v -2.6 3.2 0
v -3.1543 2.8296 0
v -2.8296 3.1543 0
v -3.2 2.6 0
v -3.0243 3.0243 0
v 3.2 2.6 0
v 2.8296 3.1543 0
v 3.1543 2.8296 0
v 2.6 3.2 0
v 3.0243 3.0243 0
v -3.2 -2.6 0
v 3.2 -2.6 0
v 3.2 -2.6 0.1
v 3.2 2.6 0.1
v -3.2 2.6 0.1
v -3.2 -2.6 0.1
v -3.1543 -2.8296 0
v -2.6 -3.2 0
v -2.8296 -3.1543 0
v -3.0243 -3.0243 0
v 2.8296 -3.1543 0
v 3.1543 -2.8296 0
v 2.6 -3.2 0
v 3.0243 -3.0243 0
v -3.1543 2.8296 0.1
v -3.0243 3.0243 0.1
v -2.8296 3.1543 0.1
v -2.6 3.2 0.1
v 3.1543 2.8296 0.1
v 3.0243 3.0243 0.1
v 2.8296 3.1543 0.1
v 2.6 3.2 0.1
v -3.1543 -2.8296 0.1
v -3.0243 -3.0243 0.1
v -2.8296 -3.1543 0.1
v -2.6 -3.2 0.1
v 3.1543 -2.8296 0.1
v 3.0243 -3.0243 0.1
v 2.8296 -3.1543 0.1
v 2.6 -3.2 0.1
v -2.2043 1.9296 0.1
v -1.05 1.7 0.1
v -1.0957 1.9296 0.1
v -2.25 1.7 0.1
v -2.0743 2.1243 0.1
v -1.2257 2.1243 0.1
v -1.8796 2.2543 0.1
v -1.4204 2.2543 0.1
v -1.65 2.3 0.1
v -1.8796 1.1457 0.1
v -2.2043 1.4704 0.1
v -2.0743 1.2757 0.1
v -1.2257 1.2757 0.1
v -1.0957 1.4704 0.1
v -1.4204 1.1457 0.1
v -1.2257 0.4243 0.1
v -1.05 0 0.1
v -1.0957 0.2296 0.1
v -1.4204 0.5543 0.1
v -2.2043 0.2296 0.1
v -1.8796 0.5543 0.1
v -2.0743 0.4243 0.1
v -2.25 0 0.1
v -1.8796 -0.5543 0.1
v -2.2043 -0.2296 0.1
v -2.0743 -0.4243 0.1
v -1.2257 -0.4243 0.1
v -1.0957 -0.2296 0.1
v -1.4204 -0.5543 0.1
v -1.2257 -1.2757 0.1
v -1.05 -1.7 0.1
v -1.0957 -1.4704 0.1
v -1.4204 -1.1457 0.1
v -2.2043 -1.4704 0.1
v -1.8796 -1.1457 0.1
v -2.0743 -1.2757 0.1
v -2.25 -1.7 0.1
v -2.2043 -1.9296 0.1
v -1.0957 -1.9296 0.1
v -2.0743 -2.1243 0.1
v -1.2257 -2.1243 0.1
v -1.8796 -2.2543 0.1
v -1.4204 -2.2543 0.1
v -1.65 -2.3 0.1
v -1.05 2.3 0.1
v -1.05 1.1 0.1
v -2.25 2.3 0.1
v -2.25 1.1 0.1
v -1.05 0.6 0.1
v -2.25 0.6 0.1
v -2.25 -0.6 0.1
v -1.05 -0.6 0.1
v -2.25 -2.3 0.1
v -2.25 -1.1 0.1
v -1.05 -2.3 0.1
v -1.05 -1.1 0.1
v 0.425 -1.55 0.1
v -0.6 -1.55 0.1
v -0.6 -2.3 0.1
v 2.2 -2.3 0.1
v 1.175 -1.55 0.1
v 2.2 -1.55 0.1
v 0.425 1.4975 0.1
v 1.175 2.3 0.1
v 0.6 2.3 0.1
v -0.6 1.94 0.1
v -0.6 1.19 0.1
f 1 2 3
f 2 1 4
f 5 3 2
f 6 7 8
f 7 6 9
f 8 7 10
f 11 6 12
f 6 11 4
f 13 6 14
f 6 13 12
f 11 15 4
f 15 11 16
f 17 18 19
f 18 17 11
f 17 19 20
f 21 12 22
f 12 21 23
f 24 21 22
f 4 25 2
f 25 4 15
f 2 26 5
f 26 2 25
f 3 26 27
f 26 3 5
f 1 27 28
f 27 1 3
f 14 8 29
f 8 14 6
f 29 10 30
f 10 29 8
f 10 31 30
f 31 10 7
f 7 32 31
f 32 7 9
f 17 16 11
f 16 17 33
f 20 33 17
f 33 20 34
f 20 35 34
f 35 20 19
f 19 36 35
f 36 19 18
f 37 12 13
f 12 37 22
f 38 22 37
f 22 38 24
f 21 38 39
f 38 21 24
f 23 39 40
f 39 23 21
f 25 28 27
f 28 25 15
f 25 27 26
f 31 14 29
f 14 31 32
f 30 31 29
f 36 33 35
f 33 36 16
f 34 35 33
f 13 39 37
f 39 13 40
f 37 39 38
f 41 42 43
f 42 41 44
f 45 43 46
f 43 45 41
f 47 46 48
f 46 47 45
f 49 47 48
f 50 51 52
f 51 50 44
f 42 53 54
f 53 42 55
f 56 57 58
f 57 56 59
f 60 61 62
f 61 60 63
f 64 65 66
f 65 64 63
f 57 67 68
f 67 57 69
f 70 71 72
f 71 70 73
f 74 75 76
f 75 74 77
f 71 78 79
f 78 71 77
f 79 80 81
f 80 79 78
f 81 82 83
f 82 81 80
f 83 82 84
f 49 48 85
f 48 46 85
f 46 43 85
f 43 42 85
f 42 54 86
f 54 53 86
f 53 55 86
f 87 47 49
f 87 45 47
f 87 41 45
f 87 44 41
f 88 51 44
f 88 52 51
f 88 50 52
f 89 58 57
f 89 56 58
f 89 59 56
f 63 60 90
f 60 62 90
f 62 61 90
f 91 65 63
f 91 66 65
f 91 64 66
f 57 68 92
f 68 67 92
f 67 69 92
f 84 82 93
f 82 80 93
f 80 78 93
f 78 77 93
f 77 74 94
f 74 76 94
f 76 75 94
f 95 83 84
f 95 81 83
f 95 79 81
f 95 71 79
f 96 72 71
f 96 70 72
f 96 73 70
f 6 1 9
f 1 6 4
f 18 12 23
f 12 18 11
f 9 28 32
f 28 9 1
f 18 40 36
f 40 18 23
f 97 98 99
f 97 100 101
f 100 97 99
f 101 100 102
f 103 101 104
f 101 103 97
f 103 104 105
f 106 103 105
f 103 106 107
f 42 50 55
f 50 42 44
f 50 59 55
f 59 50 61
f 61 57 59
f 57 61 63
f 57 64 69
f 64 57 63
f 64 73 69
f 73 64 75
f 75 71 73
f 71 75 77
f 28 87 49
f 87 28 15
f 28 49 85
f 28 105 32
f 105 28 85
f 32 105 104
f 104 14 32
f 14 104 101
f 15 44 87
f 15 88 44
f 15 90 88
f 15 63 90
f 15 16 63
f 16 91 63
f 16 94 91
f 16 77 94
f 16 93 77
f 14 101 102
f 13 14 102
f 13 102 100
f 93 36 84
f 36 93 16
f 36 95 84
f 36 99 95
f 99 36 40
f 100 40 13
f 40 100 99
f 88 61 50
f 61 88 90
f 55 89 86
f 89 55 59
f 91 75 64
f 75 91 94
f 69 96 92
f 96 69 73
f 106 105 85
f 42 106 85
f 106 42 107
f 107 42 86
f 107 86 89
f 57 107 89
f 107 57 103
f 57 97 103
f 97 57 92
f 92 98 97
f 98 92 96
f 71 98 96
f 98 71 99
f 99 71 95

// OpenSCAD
// file: ../p/box3u12.scad
use <../lib.scad>
function ldraw_lib__box3u12() = [
// 0 Box with 3 Parallel Faces without Any Edges
// 0 Name: box3u12.dat
// 0 Author: J.C. Tchang [tchang]
// 0 !LDRAW_ORG Primitive UPDATE 2014-02
// 0 !LICENSE Licensed under CC BY 4.0 : see CAreadme.txt
// 
// 0 BFC CERTIFY CCW
  [0,"BFC","CERTIFY"],
  [0,"BFC","CCW"],
// 
// 0 !HISTORY 2014-12-23 [PTadmin] Official Update 2014-02
// 
// 
// 4 16 -1 1 1 1 1 1 1 1 -1 -1 1 -1
  [4,16,-1,1,1,1,1,1,1,1,-1,-1,1,-1],
// 4 16 -1 1 1 -1 0 1 1 0 1 1 1 1
  [4,16,-1,1,1,-1,0,1,1,0,1,1,1,1],
// 4 16 1 1 -1 1 0 -1 -1 0 -1 -1 1 -1
  [4,16,1,1,-1,1,0,-1,-1,0,-1,-1,1,-1],
];
module ldraw_lib__box3u12(step=0, col=false, unit=2/5, alt=false, line=0.2, solid=!$preview)
    makepoly(ldraw_lib__box3u12(), step=step, col=col, unit=unit, alt=alt, line=line, solid=solid);
ldraw_lib__box3u12(line=0.2);
// file: ../p/7-16ndis.scad
use <../lib.scad>
function ldraw_lib__7_16ndis() = [
// 0 Disc Negative 0.4375
// 0 Name: 7-16ndis.dat
// 0 Author: Alex Taylor [anathema]
// 0 !LDRAW_ORG Primitive UPDATE 2010-01
// 0 !LICENSE Licensed under CC BY 2.0 and CC BY 4.0 : see CAreadme.txt
// 
// 0 BFC CERTIFY CCW
  [0,"BFC","CERTIFY"],
  [0,"BFC","CCW"],
// 
// 0 !HISTORY 2010-04-05 [PTadmin] Official Update 2010-01
// 
// 
// 3 16 1 0 1 0.9239 0 0.3827 1 0 0
  [3,16,1,0,1,0.9239,0,0.3827,1,0,0],
// 3 16 1 0 1 0.7071 0 0.7071 0.9239 0 0.3827
  [3,16,1,0,1,0.7071,0,0.7071,0.9239,0,0.3827],
// 3 16 1 0 1 0.3827 0 0.9239 0.7071 0 0.7071
  [3,16,1,0,1,0.3827,0,0.9239,0.7071,0,0.7071],
// 3 16 1 0 1 0 0 1 0.3827 0 0.9239
  [3,16,1,0,1,0,0,1,0.3827,0,0.9239],
// 3 16 -1 0 1 -0.3827 0 0.9239 0 0 1
  [3,16,-1,0,1,-0.3827,0,0.9239,0,0,1],
// 3 16 -1 0 1 -0.7071 0 0.7071 -0.3827 0 0.9239
  [3,16,-1,0,1,-0.7071,0,0.7071,-0.3827,0,0.9239],
// 3 16 -1 0 1 -0.9239 0 0.3827 -0.7071 0 0.7071
  [3,16,-1,0,1,-0.9239,0,0.3827,-0.7071,0,0.7071],
// 0
];
module ldraw_lib__7_16ndis(step=0, col=false, unit=2/5, alt=false, line=0.2, solid=!$preview)
    makepoly(ldraw_lib__7_16ndis(), step=step, col=col, unit=unit, alt=alt, line=line, solid=solid);
ldraw_lib__7_16ndis(line=0.2);
// file: ../p/3-16ndis.scad
use <../lib.scad>
function ldraw_lib__3_16ndis() = [
// 0 Disc Negative 0.1875
// 0 Name: 3-16ndis.dat
// 0 Author: Guy Vivan [guyvivan]
// 0 !LDRAW_ORG Primitive UPDATE 2009-01
// 0 !LICENSE Licensed under CC BY 2.0 and CC BY 4.0 : see CAreadme.txt
// 
// 0 BFC CERTIFY CCW
  [0,"BFC","CERTIFY"],
  [0,"BFC","CCW"],
// 
// 0 !HISTORY 2009-05-02 [PTadmin] Official Update 2009-01
// 
// 
// 3 16 1 0 1 0.9239 0 0.3827 1 0 0
  [3,16,1,0,1,0.9239,0,0.3827,1,0,0],
// 3 16 1 0 1 0.7071 0 0.7071 0.9239 0 0.3827
  [3,16,1,0,1,0.7071,0,0.7071,0.9239,0,0.3827],
// 3 16 1 0 1 0.3827 0 0.9239 0.7071 0 0.7071
  [3,16,1,0,1,0.3827,0,0.9239,0.7071,0,0.7071],
// 
// 0 end of file
// 
];
module ldraw_lib__3_16ndis(step=0, col=false, unit=2/5, alt=false, line=0.2, solid=!$preview)
    makepoly(ldraw_lib__3_16ndis(), step=step, col=col, unit=unit, alt=alt, line=line, solid=solid);
ldraw_lib__3_16ndis(line=0.2);
// file: ../p/3-16chrd.scad
use <../lib.scad>
function ldraw_lib__3_16chrd() = [
// 0 Chord 0.1875
// 0 Name: 3-16chrd.dat
// 0 Author: Niels Karsdorp [nielsk]
// 0 !LDRAW_ORG Primitive UPDATE 2009-01
// 0 !LICENSE Licensed under CC BY 2.0 and CC BY 4.0 : see CAreadme.txt
// 
// 0 BFC CERTIFY CCW
  [0,"BFC","CERTIFY"],
  [0,"BFC","CCW"],
// 
// 0 !HISTORY 2009-05-02 [PTadmin] Official Update 2009-01
// 
// 
// 4 16 1 0 0 0.9239 0 0.3827 0.7071 0 0.7071 0.3827 0 0.9239
  [4,16,1,0,0,0.9239,0,0.3827,0.7071,0,0.7071,0.3827,0,0.9239],
// 0
// 
];
module ldraw_lib__3_16chrd(step=0, col=false, unit=2/5, alt=false, line=0.2, solid=!$preview)
    makepoly(ldraw_lib__3_16chrd(), step=step, col=col, unit=unit, alt=alt, line=line, solid=solid);
ldraw_lib__3_16chrd(line=0.2);
// file: ../p/2-4chrd.scad
use <../lib.scad>
function ldraw_lib__2_4chrd() = [
// 0 Chord 0.5
// 0 Name: 2-4chrd.dat
// 0 Author: Philippe Hurbain [Philo]
// 0 !LDRAW_ORG Primitive UPDATE 2014-01
// 0 !LICENSE Licensed under CC BY 4.0 : see CAreadme.txt
// 
// 0 BFC CERTIFY CCW
  [0,"BFC","CERTIFY"],
  [0,"BFC","CCW"],
// 
// 0 !HISTORY 2014-06-21 [PTadmin] Official Update 2014-01
// 
// 
// 4 16 0.9239 0 0.3827 -0.9239 0 0.3827 -1 0 0 1 0 0
  [4,16,0.9239,0,0.3827,-0.9239,0,0.3827,-1,0,0,1,0,0],
// 4 16 0.7071 0 0.7071 -0.7071 0 0.7071 -0.9239 0 0.3827 0.9239 0 0.3827
  [4,16,0.7071,0,0.7071,-0.7071,0,0.7071,-0.9239,0,0.3827,0.9239,0,0.3827],
// 4 16 0.3827 0 0.9239 -0.3827 0 0.9239 -0.7071 0 0.7071 0.7071 0 0.7071
  [4,16,0.3827,0,0.9239,-0.3827,0,0.9239,-0.7071,0,0.7071,0.7071,0,0.7071],
// 3 16 0 0 1 -0.3827 0 0.9239 0.3827 0 0.9239
  [3,16,0,0,1,-0.3827,0,0.9239,0.3827,0,0.9239],
];
module ldraw_lib__2_4chrd(step=0, col=false, unit=2/5, alt=false, line=0.2, solid=!$preview)
    makepoly(ldraw_lib__2_4chrd(), step=step, col=col, unit=unit, alt=alt, line=line, solid=solid);
ldraw_lib__2_4chrd(line=0.2);
// file: ../p/1-4cyli.scad
use <../lib.scad>
function ldraw_lib__1_4cyli() = [
// 0 Cylinder 0.25
// 0 Name: 1-4cyli.dat
// 0 Author: James Jessiman
// 0 !LDRAW_ORG Primitive UPDATE 2012-01
// 0 !LICENSE Licensed under CC BY 4.0 : see CAreadme.txt
// 
// 0 BFC CERTIFY CCW
  [0,"BFC","CERTIFY"],
  [0,"BFC","CCW"],
// 
// 0 !HISTORY 2002-03-23 [sbliss] Added BFC statement.
// 0 !HISTORY 2002-04-25 [PTadmin] Official Update 2002-02
// 0 !HISTORY 2007-06-22 [PTadmin] Header formatted for Contributor Agreement
// 0 !HISTORY 2008-07-01 [PTadmin] Official Update 2008-01
// 0 !HISTORY 2012-02-16 [Philo] Changed to CCW
// 0 !HISTORY 2012-03-30 [PTadmin] Official Update 2012-01
// 
// 
// 4 16 1 1 0 0.9239 1 0.3827 0.9239 0 0.3827 1 0 0
  [4,16,1,1,0,0.9239,1,0.3827,0.9239,0,0.3827,1,0,0],
// 5 24 1 0 0 1 1 0 0.9239 0 0.3827 1 0 -1
  [5,24,1,0,0,1,1,0,0.9239,0,0.3827,1,0,-1],
// 4 16 0.9239 1 0.3827 0.7071 1 0.7071 0.7071 0 0.7071 0.9239 0 0.3827
  [4,16,0.9239,1,0.3827,0.7071,1,0.7071,0.7071,0,0.7071,0.9239,0,0.3827],
// 5 24 0.9239 0 0.3827 0.9239 1 0.3827 0.7071 0 0.7071 1 0 0
  [5,24,0.9239,0,0.3827,0.9239,1,0.3827,0.7071,0,0.7071,1,0,0],
// 4 16 0.7071 1 0.7071 0.3827 1 0.9239 0.3827 0 0.9239 0.7071 0 0.7071
  [4,16,0.7071,1,0.7071,0.3827,1,0.9239,0.3827,0,0.9239,0.7071,0,0.7071],
// 5 24 0.7071 0 0.7071 0.7071 1 0.7071 0.3827 0 0.9239 0.9239 0 0.3827
  [5,24,0.7071,0,0.7071,0.7071,1,0.7071,0.3827,0,0.9239,0.9239,0,0.3827],
// 4 16 0.3827 1 0.9239 0 1 1 0 0 1 0.3827 0 0.9239
  [4,16,0.3827,1,0.9239,0,1,1,0,0,1,0.3827,0,0.9239],
// 5 24 0.3827 0 0.9239 0.3827 1 0.9239 0 0 1 0.7071 0 0.7071
  [5,24,0.3827,0,0.9239,0.3827,1,0.9239,0,0,1,0.7071,0,0.7071],
// 5 24 0 0 1 0 1 1 0.3827 0 0.9239 -1 0 1
  [5,24,0,0,1,0,1,1,0.3827,0,0.9239,-1,0,1],
];
module ldraw_lib__1_4cyli(step=0, col=false, unit=2/5, alt=false, line=0.2, solid=!$preview)
    makepoly(ldraw_lib__1_4cyli(), step=step, col=col, unit=unit, alt=alt, line=line, solid=solid);
ldraw_lib__1_4cyli(line=0.2);
// file: ../p/1-4chrd.scad
use <../lib.scad>
function ldraw_lib__1_4chrd() = [
// 0 Chord 0.25
// 0 Name: 1-4chrd.dat
// 0 Author: Tony Hafner [hafhead]
// 0 !LDRAW_ORG Primitive UPDATE 2012-02
// 0 !LICENSE Licensed under CC BY 2.0 and CC BY 4.0 : see CAreadme.txt
// 
// 0 BFC CERTIFY CCW
  [0,"BFC","CERTIFY"],
  [0,"BFC","CCW"],
// 
// 0 !HISTORY 2004-04-22 [PTadmin] Official Update 2004-02
// 0 !HISTORY 2007-10-09 [PTadmin] Header formatted for Contributor Agreement
// 0 !HISTORY 2008-07-01 [PTadmin] Official Update 2008-01
// 0 !HISTORY 2012-08-02 [MMR1988] Re-creation with PrimGen2 and Rectifier
// 0 !HISTORY 2012-08-09 [PTadmin] Official Update 2012-02
// 
// 
// 4 16 0.9239 0 0.3827 0.3827 0 0.9239 0 0 1 1 0 0
  [4,16,0.9239,0,0.3827,0.3827,0,0.9239,0,0,1,1,0,0],
// 3 16 0.7071 0 0.7071 0.3827 0 0.9239 0.9239 0 0.3827
  [3,16,0.7071,0,0.7071,0.3827,0,0.9239,0.9239,0,0.3827],
];
module ldraw_lib__1_4chrd(step=0, col=false, unit=2/5, alt=false, line=0.2, solid=!$preview)
    makepoly(ldraw_lib__1_4chrd(), step=step, col=col, unit=unit, alt=alt, line=line, solid=solid);
ldraw_lib__1_4chrd(line=0.2);
// main file
use <../lib.scad>
use <../p/1-4chrd.scad>
use <../p/1-4cyli.scad>
use <../p/2-4chrd.scad>
use <../p/3-16chrd.scad>
use <../p/3-16ndis.scad>
use <../p/7-16ndis.scad>
use <../p/box3u12.scad>
function ldraw_lib__6142275d() = [
// 0 Sticker  0.8 x  0.8 with White Number 1 and  3 Dark Grey Circles Left on Red Background
// 0 Name: 6142275d.dat
// 0 Author: Massimo Maso [Sirio]
// 0 !LDRAW_ORG Part UPDATE 2022-06
// 0 !LICENSE Licensed under CC BY 4.0 : see CAreadme.txt
// 
// 0 BFC CERTIFY CCW
  [0,"BFC","CERTIFY"],
  [0,"BFC","CCW"],
// 
// 0 !KEYWORDS Audi, e-tron, quattro, R18, Set 75872, Speed Champions
// 
// 0 !HISTORY 2022-12-20 [PTadmin] Official Update 2022-06
// 
// 
// 0 // Primitives
// 
// 1 16 -6.5 0 6.5 -1.5 0 0 0 -1 0 0 0 1.5 1-4chrd.dat
  [1,16,-6.5,0,6.5,-1.5,0,0,0,-1,0,0,0,1.5, ldraw_lib__1_4chrd()],
// 1 16 6.5 0 6.5 1.5 0 0 0 -1 0 0 0 1.5 1-4chrd.dat
  [1,16,6.5,0,6.5,1.5,0,0,0,-1,0,0,0,1.5, ldraw_lib__1_4chrd()],
// 1 16 0 -.25 0 0 0 8 0 .25 0 -6.5 0 0 box3u12.dat
  [1,16,0,-.25,0,0,0,8,0,.25,0,-6.5,0,0, ldraw_lib__box3u12()],
// 1 16 -6.5 0 -6.5 -1.5 0 0 0 -1 0 0 0 -1.5 1-4chrd.dat
  [1,16,-6.5,0,-6.5,-1.5,0,0,0,-1,0,0,0,-1.5, ldraw_lib__1_4chrd()],
// 1 16 6.5 0 -6.5 1.5 0 0 0 -1 0 0 0 -1.5 1-4chrd.dat
  [1,16,6.5,0,-6.5,1.5,0,0,0,-1,0,0,0,-1.5, ldraw_lib__1_4chrd()],
// 1 16 -6.5 0 6.5 -1.5 0 0 0 -.25 0 0 0 1.5 1-4cyli.dat
  [1,16,-6.5,0,6.5,-1.5,0,0,0,-.25,0,0,0,1.5, ldraw_lib__1_4cyli()],
// 1 16 6.5 0 6.5 1.5 0 0 0 -.25 0 0 0 1.5 1-4cyli.dat
  [1,16,6.5,0,6.5,1.5,0,0,0,-.25,0,0,0,1.5, ldraw_lib__1_4cyli()],
// 1 16 -6.5 0 -6.5 -1.5 0 0 0 -.25 0 0 0 -1.5 1-4cyli.dat
  [1,16,-6.5,0,-6.5,-1.5,0,0,0,-.25,0,0,0,-1.5, ldraw_lib__1_4cyli()],
// 1 16 6.5 0 -6.5 1.5 0 0 0 -.25 0 0 0 -1.5 1-4cyli.dat
  [1,16,6.5,0,-6.5,1.5,0,0,0,-.25,0,0,0,-1.5, ldraw_lib__1_4cyli()],
// 1 4 -6.5 -.25 6.5 -1.5 0 0 0 1 0 0 0 1.5 1-4chrd.dat
  [1,4,-6.5,-.25,6.5,-1.5,0,0,0,1,0,0,0,1.5, ldraw_lib__1_4chrd()],
// 1 4 6.5 -.25 6.5 1.5 0 0 0 1 0 0 0 1.5 1-4chrd.dat
  [1,4,6.5,-.25,6.5,1.5,0,0,0,1,0,0,0,1.5, ldraw_lib__1_4chrd()],
// 1 4 -6.5 -.25 -6.5 -1.5 0 0 0 1 0 0 0 -1.5 1-4chrd.dat
  [1,4,-6.5,-.25,-6.5,-1.5,0,0,0,1,0,0,0,-1.5, ldraw_lib__1_4chrd()],
// 1 4 6.5 -.25 -6.5 1.5 0 0 0 1 0 0 0 -1.5 1-4chrd.dat
  [1,4,6.5,-.25,-6.5,1.5,0,0,0,1,0,0,0,-1.5, ldraw_lib__1_4chrd()],
// 1 72 -4.125 -.25 4.25 1.5 0 0 0 1 0 0 0 1.5 2-4chrd.dat
  [1,72,-4.125,-.25,4.25,1.5,0,0,0,1,0,0,0,1.5, ldraw_lib__2_4chrd()],
// 1 72 -4.125 -.25 4.25 -1.5 0 0 0 1 0 0 0 -1.5 3-16chrd.dat
  [1,72,-4.125,-.25,4.25,-1.5,0,0,0,1,0,0,0,-1.5, ldraw_lib__3_16chrd()],
// 1 72 -4.125 -.25 4.25 1.5 0 0 0 1 0 0 0 -1.5 3-16chrd.dat
  [1,72,-4.125,-.25,4.25,1.5,0,0,0,1,0,0,0,-1.5, ldraw_lib__3_16chrd()],
// 1 72 -4.125 -.25 0 1.5 0 0 0 1 0 0 0 1.5 3-16chrd.dat
  [1,72,-4.125,-.25,0,1.5,0,0,0,1,0,0,0,1.5, ldraw_lib__3_16chrd()],
// 1 72 -4.125 -.25 0 -1.5 0 0 0 1 0 0 0 1.5 3-16chrd.dat
  [1,72,-4.125,-.25,0,-1.5,0,0,0,1,0,0,0,1.5, ldraw_lib__3_16chrd()],
// 1 72 -4.125 -.25 0 -1.5 0 0 0 1 0 0 0 -1.5 3-16chrd.dat
  [1,72,-4.125,-.25,0,-1.5,0,0,0,1,0,0,0,-1.5, ldraw_lib__3_16chrd()],
// 1 72 -4.125 -.25 0 1.5 0 0 0 1 0 0 0 -1.5 3-16chrd.dat
  [1,72,-4.125,-.25,0,1.5,0,0,0,1,0,0,0,-1.5, ldraw_lib__3_16chrd()],
// 1 72 -4.125 -.25 -4.25 1.5 0 0 0 1 0 0 0 1.5 3-16chrd.dat
  [1,72,-4.125,-.25,-4.25,1.5,0,0,0,1,0,0,0,1.5, ldraw_lib__3_16chrd()],
// 1 72 -4.125 -.25 -4.25 -1.5 0 0 0 1 0 0 0 1.5 3-16chrd.dat
  [1,72,-4.125,-.25,-4.25,-1.5,0,0,0,1,0,0,0,1.5, ldraw_lib__3_16chrd()],
// 1 72 -4.125 -.25 -4.25 1.5 0 0 0 1 0 0 0 -1.5 2-4chrd.dat
  [1,72,-4.125,-.25,-4.25,1.5,0,0,0,1,0,0,0,-1.5, ldraw_lib__2_4chrd()],
// 1 4 -4.125 -.25 4.25 0 0 1.5 0 1 0 1.5 0 0 7-16ndis.dat
  [1,4,-4.125,-.25,4.25,0,0,1.5,0,1,0,1.5,0,0, ldraw_lib__7_16ndis()],
// 1 4 -4.125 -.25 4.25 0 0 -1.5 0 1 0 1.5 0 0 7-16ndis.dat
  [1,4,-4.125,-.25,4.25,0,0,-1.5,0,1,0,1.5,0,0, ldraw_lib__7_16ndis()],
// 1 4 -4.125 -.25 0 1.5 0 0 0 1 0 0 0 1.5 3-16ndis.dat
  [1,4,-4.125,-.25,0,1.5,0,0,0,1,0,0,0,1.5, ldraw_lib__3_16ndis()],
// 1 4 -4.125 -.25 0 -1.5 0 0 0 1 0 0 0 1.5 3-16ndis.dat
  [1,4,-4.125,-.25,0,-1.5,0,0,0,1,0,0,0,1.5, ldraw_lib__3_16ndis()],
// 1 4 -4.125 -.25 0 -1.5 0 0 0 1 0 0 0 -1.5 3-16ndis.dat
  [1,4,-4.125,-.25,0,-1.5,0,0,0,1,0,0,0,-1.5, ldraw_lib__3_16ndis()],
// 1 4 -4.125 -.25 0 1.5 0 0 0 1 0 0 0 -1.5 3-16ndis.dat
  [1,4,-4.125,-.25,0,1.5,0,0,0,1,0,0,0,-1.5, ldraw_lib__3_16ndis()],
// 1 4 -4.125 -.25 -4.25 0 0 -1.5 0 1 0 -1.5 0 0 7-16ndis.dat
  [1,4,-4.125,-.25,-4.25,0,0,-1.5,0,1,0,-1.5,0,0, ldraw_lib__7_16ndis()],
// 1 4 -4.125 -.25 -4.25 0 0 1.5 0 1 0 -1.5 0 0 7-16ndis.dat
  [1,4,-4.125,-.25,-4.25,0,0,1.5,0,1,0,-1.5,0,0, ldraw_lib__7_16ndis()],
// 0 // Bottom faces
// 4 16 6.5 0 8 8 0 6.5 -8 0 6.5 -6.5 0 8
  [4,16,6.5,0,8,8,0,6.5,-8,0,6.5,-6.5,0,8],
// 4 16 6.5 0 -8 -6.5 0 -8 -8 0 -6.5 8 0 -6.5
  [4,16,6.5,0,-8,-6.5,0,-8,-8,0,-6.5,8,0,-6.5],
// 0 // Lateral faces
// 4 16 -6.5 0 8 -6.5 -.25 8 6.5 -.25 8 6.5 0 8
  [4,16,-6.5,0,8,-6.5,-.25,8,6.5,-.25,8,6.5,0,8],
// 4 16 -6.5 0 -8 6.5 0 -8 6.5 -.25 -8 -6.5 -.25 -8
  [4,16,-6.5,0,-8,6.5,0,-8,6.5,-.25,-8,-6.5,-.25,-8],
// 0 // Top faces
// 0 // White number 1
// 3 15 1.0625 -.25 -3.875 -1.5 -.25 -3.875 -1.5 -.25 -5.75
  [3,15,1.0625,-.25,-3.875,-1.5,-.25,-3.875,-1.5,-.25,-5.75],
// 4 15 1.0625 -.25 -3.875 -1.5 -.25 -5.75 5.5 -.25 -5.75 2.9375 -.25 -3.875
  [4,15,1.0625,-.25,-3.875,-1.5,-.25,-5.75,5.5,-.25,-5.75,2.9375,-.25,-3.875],
// 3 15 2.9375 -.25 -3.875 5.5 -.25 -5.75 5.5 -.25 -3.875
  [3,15,2.9375,-.25,-3.875,5.5,-.25,-5.75,5.5,-.25,-3.875],
// 4 15 2.9375 -.25 -3.875 2.9375 -.25 5.75 1.0625 -.25 3.74375 1.0625 -.25 -3.875
  [4,15,2.9375,-.25,-3.875,2.9375,-.25,5.75,1.0625,-.25,3.74375,1.0625,-.25,-3.875],
// 3 15 1.0625 -.25 3.74375 2.9375 -.25 5.75 1.5 -.25 5.75
  [3,15,1.0625,-.25,3.74375,2.9375,-.25,5.75,1.5,-.25,5.75],
// 4 15 1.0625 -.25 3.74375 1.5 -.25 5.75 -1.5 -.25 4.85 -1.5 -.25 2.975
  [4,15,1.0625,-.25,3.74375,1.5,-.25,5.75,-1.5,-.25,4.85,-1.5,-.25,2.975],
// 0 // Grey faces
// 4 72 -5.625 -.25 4.25 -4.69905 -.25 2.86415 -3.55095 -.25 2.86415 -2.625 -.25 4.25
  [4,72,-5.625,-.25,4.25,-4.69905,-.25,2.86415,-3.55095,-.25,2.86415,-2.625,-.25,4.25],
// 4 72 -4.69905 -.25 2.86415 -4.69905 -.25 1.38585 -3.55095 -.25 1.38585 -3.55095 -.25 2.86415
  [4,72,-4.69905,-.25,2.86415,-4.69905,-.25,1.38585,-3.55095,-.25,1.38585,-3.55095,-.25,2.86415],
// 4 72 -4.69905 -.25 1.38585 -5.625 -.25 0 -2.625 -.25 0 -3.55095 -.25 1.38585
  [4,72,-4.69905,-.25,1.38585,-5.625,-.25,0,-2.625,-.25,0,-3.55095,-.25,1.38585],
// 4 72 -2.625 -.25 0 -5.625 -.25 0 -4.69905 -.25 -1.38585 -3.55095 -.25 -1.38585
  [4,72,-2.625,-.25,0,-5.625,-.25,0,-4.69905,-.25,-1.38585,-3.55095,-.25,-1.38585],
// 4 72 -3.55095 -.25 -1.38585 -4.69905 -.25 -1.38585 -4.69905 -.25 -2.86415 -3.55095 -.25 -2.86415
  [4,72,-3.55095,-.25,-1.38585,-4.69905,-.25,-1.38585,-4.69905,-.25,-2.86415,-3.55095,-.25,-2.86415],
// 4 72 -4.69905 -.25 -2.86415 -5.625 -.25 -4.25 -2.625 -.25 -4.25 -3.55095 -.25 -2.86415
  [4,72,-4.69905,-.25,-2.86415,-5.625,-.25,-4.25,-2.625,-.25,-4.25,-3.55095,-.25,-2.86415],
// 0 // Red faces
// 4 4 -6.5 -.25 8 -8 -.25 6.5 -5.625 -.25 5.75 -4.125 -.25 5.75
  [4,4,-6.5,-.25,8,-8,-.25,6.5,-5.625,-.25,5.75,-4.125,-.25,5.75],
// 3 4 -6.5 -.25 8 -4.125 -.25 5.75 -2.625 -.25 5.75
  [3,4,-6.5,-.25,8,-4.125,-.25,5.75,-2.625,-.25,5.75],
// 4 4 -6.5 -.25 8 -2.625 -.25 5.75 1.5 -.25 5.75 6.5 -.25 8
  [4,4,-6.5,-.25,8,-2.625,-.25,5.75,1.5,-.25,5.75,6.5,-.25,8],
// 3 4 6.5 -.25 8 1.5 -.25 5.75 2.9375 -.25 5.75
  [3,4,6.5,-.25,8,1.5,-.25,5.75,2.9375,-.25,5.75],
// 4 4 6.5 -.25 8 2.9375 -.25 5.75 2.9375 -.25 -3.875 8 -.25 6.5
  [4,4,6.5,-.25,8,2.9375,-.25,5.75,2.9375,-.25,-3.875,8,-.25,6.5],
// 3 4 -8 -.25 6.5 -5.625 -.25 4.25 -5.625 -.25 5.75
  [3,4,-8,-.25,6.5,-5.625,-.25,4.25,-5.625,-.25,5.75],
// 3 4 -8 -.25 6.5 -5.625 -.25 2.75 -5.625 -.25 4.25
  [3,4,-8,-.25,6.5,-5.625,-.25,2.75,-5.625,-.25,4.25],
// 3 4 -8 -.25 6.5 -5.625 -.25 1.5 -5.625 -.25 2.75
  [3,4,-8,-.25,6.5,-5.625,-.25,1.5,-5.625,-.25,2.75],
// 3 4 -8 -.25 6.5 -5.625 -.25 0 -5.625 -.25 1.5
  [3,4,-8,-.25,6.5,-5.625,-.25,0,-5.625,-.25,1.5],
// 3 4 -8 -.25 6.5 -8 -.25 -6.5 -5.625 -.25 0
  [3,4,-8,-.25,6.5,-8,-.25,-6.5,-5.625,-.25,0],
// 3 4 -8 -.25 -6.5 -5.625 -.25 -1.5 -5.625 -.25 0
  [3,4,-8,-.25,-6.5,-5.625,-.25,-1.5,-5.625,-.25,0],
// 3 4 -8 -.25 -6.5 -5.625 -.25 -2.75 -5.625 -.25 -1.5
  [3,4,-8,-.25,-6.5,-5.625,-.25,-2.75,-5.625,-.25,-1.5],
// 3 4 -8 -.25 -6.5 -5.625 -.25 -4.25 -5.625 -.25 -2.75
  [3,4,-8,-.25,-6.5,-5.625,-.25,-4.25,-5.625,-.25,-2.75],
// 3 4 -8 -.25 -6.5 -5.625 -.25 -5.75 -5.625 -.25 -4.25
  [3,4,-8,-.25,-6.5,-5.625,-.25,-5.75,-5.625,-.25,-4.25],
// 3 4 8 -.25 6.5 2.9375 -.25 -3.875 5.5 -.25 -3.875
  [3,4,8,-.25,6.5,2.9375,-.25,-3.875,5.5,-.25,-3.875],
// 3 4 8 -.25 -6.5 8 -.25 6.5 5.5 -.25 -3.875
  [3,4,8,-.25,-6.5,8,-.25,6.5,5.5,-.25,-3.875],
// 3 4 8 -.25 -6.5 5.5 -.25 -3.875 5.5 -.25 -5.75
  [3,4,8,-.25,-6.5,5.5,-.25,-3.875,5.5,-.25,-5.75],
// 4 4 -6.5 -.25 -8 -4.125 -.25 -5.75 -5.625 -.25 -5.75 -8 -.25 -6.5
  [4,4,-6.5,-.25,-8,-4.125,-.25,-5.75,-5.625,-.25,-5.75,-8,-.25,-6.5],
// 3 4 -6.5 -.25 -8 -2.625 -.25 -5.75 -4.125 -.25 -5.75
  [3,4,-6.5,-.25,-8,-2.625,-.25,-5.75,-4.125,-.25,-5.75],
// 4 4 -6.5 -.25 -8 6.5 -.25 -8 -1.5 -.25 -5.75 -2.625 -.25 -5.75
  [4,4,-6.5,-.25,-8,6.5,-.25,-8,-1.5,-.25,-5.75,-2.625,-.25,-5.75],
// 4 4 6.5 -.25 -8 8 -.25 -6.5 5.5 -.25 -5.75 -1.5 -.25 -5.75
  [4,4,6.5,-.25,-8,8,-.25,-6.5,5.5,-.25,-5.75,-1.5,-.25,-5.75],
// 4 4 -5.625 -.25 2.75 -5.625 -.25 1.5 -4.69905 -.25 1.38585 -4.69905 -.25 2.86415
  [4,4,-5.625,-.25,2.75,-5.625,-.25,1.5,-4.69905,-.25,1.38585,-4.69905,-.25,2.86415],
// 4 4 -3.55095 -.25 2.86415 -3.55095 -.25 1.38585 -2.625 -.25 1.5 -2.625 -.25 2.75
  [4,4,-3.55095,-.25,2.86415,-3.55095,-.25,1.38585,-2.625,-.25,1.5,-2.625,-.25,2.75],
// 4 4 -5.625 -.25 -1.5 -5.625 -.25 -2.75 -4.69905 -.25 -2.86415 -4.69905 -.25 -1.38585
  [4,4,-5.625,-.25,-1.5,-5.625,-.25,-2.75,-4.69905,-.25,-2.86415,-4.69905,-.25,-1.38585],
// 4 4 -3.55095 -.25 -1.38585 -3.55095 -.25 -2.86415 -2.625 -.25 -2.75 -2.625 -.25 -1.5
  [4,4,-3.55095,-.25,-1.38585,-3.55095,-.25,-2.86415,-2.625,-.25,-2.75,-2.625,-.25,-1.5],
// 3 4 -1.5 -.25 4.85 1.5 -.25 5.75 -2.625 -.25 5.75
  [3,4,-1.5,-.25,4.85,1.5,-.25,5.75,-2.625,-.25,5.75],
// 4 4 -1.5 -.25 4.85 -2.625 -.25 5.75 -2.625 -.25 4.25 -1.5 -.25 2.975
  [4,4,-1.5,-.25,4.85,-2.625,-.25,5.75,-2.625,-.25,4.25,-1.5,-.25,2.975],
// 3 4 -1.5 -.25 2.975 -2.625 -.25 4.25 -2.625 -.25 2.75
  [3,4,-1.5,-.25,2.975,-2.625,-.25,4.25,-2.625,-.25,2.75],
// 3 4 -1.5 -.25 2.975 -2.625 -.25 2.75 -2.625 -.25 1.5
  [3,4,-1.5,-.25,2.975,-2.625,-.25,2.75,-2.625,-.25,1.5],
// 4 4 1.0625 -.25 3.74375 -1.5 -.25 2.975 -2.625 -.25 1.5 -2.625 -.25 0
  [4,4,1.0625,-.25,3.74375,-1.5,-.25,2.975,-2.625,-.25,1.5,-2.625,-.25,0],
// 4 4 1.0625 -.25 3.74375 -2.625 -.25 0 -2.625 -.25 -1.5 1.0625 -.25 -3.875
  [4,4,1.0625,-.25,3.74375,-2.625,-.25,0,-2.625,-.25,-1.5,1.0625,-.25,-3.875],
// 4 4 -1.5 -.25 -3.875 1.0625 -.25 -3.875 -2.625 -.25 -1.5 -2.625 -.25 -2.75
  [4,4,-1.5,-.25,-3.875,1.0625,-.25,-3.875,-2.625,-.25,-1.5,-2.625,-.25,-2.75],
// 4 4 -1.5 -.25 -3.875 -2.625 -.25 -2.75 -2.625 -.25 -4.25 -1.5 -.25 -5.75
  [4,4,-1.5,-.25,-3.875,-2.625,-.25,-2.75,-2.625,-.25,-4.25,-1.5,-.25,-5.75],
// 3 4 -1.5 -.25 -5.75 -2.625 -.25 -4.25 -2.625 -.25 -5.75
  [3,4,-1.5,-.25,-5.75,-2.625,-.25,-4.25,-2.625,-.25,-5.75],
];
module ldraw_lib__6142275d(step=0, col=false, unit=2/5, alt=false, line=0.2, solid=!$preview)
    makepoly(ldraw_lib__6142275d(), step=step, col=col, unit=unit, alt=alt, line=line, solid=solid);
ldraw_lib__6142275d(line=0.2);
